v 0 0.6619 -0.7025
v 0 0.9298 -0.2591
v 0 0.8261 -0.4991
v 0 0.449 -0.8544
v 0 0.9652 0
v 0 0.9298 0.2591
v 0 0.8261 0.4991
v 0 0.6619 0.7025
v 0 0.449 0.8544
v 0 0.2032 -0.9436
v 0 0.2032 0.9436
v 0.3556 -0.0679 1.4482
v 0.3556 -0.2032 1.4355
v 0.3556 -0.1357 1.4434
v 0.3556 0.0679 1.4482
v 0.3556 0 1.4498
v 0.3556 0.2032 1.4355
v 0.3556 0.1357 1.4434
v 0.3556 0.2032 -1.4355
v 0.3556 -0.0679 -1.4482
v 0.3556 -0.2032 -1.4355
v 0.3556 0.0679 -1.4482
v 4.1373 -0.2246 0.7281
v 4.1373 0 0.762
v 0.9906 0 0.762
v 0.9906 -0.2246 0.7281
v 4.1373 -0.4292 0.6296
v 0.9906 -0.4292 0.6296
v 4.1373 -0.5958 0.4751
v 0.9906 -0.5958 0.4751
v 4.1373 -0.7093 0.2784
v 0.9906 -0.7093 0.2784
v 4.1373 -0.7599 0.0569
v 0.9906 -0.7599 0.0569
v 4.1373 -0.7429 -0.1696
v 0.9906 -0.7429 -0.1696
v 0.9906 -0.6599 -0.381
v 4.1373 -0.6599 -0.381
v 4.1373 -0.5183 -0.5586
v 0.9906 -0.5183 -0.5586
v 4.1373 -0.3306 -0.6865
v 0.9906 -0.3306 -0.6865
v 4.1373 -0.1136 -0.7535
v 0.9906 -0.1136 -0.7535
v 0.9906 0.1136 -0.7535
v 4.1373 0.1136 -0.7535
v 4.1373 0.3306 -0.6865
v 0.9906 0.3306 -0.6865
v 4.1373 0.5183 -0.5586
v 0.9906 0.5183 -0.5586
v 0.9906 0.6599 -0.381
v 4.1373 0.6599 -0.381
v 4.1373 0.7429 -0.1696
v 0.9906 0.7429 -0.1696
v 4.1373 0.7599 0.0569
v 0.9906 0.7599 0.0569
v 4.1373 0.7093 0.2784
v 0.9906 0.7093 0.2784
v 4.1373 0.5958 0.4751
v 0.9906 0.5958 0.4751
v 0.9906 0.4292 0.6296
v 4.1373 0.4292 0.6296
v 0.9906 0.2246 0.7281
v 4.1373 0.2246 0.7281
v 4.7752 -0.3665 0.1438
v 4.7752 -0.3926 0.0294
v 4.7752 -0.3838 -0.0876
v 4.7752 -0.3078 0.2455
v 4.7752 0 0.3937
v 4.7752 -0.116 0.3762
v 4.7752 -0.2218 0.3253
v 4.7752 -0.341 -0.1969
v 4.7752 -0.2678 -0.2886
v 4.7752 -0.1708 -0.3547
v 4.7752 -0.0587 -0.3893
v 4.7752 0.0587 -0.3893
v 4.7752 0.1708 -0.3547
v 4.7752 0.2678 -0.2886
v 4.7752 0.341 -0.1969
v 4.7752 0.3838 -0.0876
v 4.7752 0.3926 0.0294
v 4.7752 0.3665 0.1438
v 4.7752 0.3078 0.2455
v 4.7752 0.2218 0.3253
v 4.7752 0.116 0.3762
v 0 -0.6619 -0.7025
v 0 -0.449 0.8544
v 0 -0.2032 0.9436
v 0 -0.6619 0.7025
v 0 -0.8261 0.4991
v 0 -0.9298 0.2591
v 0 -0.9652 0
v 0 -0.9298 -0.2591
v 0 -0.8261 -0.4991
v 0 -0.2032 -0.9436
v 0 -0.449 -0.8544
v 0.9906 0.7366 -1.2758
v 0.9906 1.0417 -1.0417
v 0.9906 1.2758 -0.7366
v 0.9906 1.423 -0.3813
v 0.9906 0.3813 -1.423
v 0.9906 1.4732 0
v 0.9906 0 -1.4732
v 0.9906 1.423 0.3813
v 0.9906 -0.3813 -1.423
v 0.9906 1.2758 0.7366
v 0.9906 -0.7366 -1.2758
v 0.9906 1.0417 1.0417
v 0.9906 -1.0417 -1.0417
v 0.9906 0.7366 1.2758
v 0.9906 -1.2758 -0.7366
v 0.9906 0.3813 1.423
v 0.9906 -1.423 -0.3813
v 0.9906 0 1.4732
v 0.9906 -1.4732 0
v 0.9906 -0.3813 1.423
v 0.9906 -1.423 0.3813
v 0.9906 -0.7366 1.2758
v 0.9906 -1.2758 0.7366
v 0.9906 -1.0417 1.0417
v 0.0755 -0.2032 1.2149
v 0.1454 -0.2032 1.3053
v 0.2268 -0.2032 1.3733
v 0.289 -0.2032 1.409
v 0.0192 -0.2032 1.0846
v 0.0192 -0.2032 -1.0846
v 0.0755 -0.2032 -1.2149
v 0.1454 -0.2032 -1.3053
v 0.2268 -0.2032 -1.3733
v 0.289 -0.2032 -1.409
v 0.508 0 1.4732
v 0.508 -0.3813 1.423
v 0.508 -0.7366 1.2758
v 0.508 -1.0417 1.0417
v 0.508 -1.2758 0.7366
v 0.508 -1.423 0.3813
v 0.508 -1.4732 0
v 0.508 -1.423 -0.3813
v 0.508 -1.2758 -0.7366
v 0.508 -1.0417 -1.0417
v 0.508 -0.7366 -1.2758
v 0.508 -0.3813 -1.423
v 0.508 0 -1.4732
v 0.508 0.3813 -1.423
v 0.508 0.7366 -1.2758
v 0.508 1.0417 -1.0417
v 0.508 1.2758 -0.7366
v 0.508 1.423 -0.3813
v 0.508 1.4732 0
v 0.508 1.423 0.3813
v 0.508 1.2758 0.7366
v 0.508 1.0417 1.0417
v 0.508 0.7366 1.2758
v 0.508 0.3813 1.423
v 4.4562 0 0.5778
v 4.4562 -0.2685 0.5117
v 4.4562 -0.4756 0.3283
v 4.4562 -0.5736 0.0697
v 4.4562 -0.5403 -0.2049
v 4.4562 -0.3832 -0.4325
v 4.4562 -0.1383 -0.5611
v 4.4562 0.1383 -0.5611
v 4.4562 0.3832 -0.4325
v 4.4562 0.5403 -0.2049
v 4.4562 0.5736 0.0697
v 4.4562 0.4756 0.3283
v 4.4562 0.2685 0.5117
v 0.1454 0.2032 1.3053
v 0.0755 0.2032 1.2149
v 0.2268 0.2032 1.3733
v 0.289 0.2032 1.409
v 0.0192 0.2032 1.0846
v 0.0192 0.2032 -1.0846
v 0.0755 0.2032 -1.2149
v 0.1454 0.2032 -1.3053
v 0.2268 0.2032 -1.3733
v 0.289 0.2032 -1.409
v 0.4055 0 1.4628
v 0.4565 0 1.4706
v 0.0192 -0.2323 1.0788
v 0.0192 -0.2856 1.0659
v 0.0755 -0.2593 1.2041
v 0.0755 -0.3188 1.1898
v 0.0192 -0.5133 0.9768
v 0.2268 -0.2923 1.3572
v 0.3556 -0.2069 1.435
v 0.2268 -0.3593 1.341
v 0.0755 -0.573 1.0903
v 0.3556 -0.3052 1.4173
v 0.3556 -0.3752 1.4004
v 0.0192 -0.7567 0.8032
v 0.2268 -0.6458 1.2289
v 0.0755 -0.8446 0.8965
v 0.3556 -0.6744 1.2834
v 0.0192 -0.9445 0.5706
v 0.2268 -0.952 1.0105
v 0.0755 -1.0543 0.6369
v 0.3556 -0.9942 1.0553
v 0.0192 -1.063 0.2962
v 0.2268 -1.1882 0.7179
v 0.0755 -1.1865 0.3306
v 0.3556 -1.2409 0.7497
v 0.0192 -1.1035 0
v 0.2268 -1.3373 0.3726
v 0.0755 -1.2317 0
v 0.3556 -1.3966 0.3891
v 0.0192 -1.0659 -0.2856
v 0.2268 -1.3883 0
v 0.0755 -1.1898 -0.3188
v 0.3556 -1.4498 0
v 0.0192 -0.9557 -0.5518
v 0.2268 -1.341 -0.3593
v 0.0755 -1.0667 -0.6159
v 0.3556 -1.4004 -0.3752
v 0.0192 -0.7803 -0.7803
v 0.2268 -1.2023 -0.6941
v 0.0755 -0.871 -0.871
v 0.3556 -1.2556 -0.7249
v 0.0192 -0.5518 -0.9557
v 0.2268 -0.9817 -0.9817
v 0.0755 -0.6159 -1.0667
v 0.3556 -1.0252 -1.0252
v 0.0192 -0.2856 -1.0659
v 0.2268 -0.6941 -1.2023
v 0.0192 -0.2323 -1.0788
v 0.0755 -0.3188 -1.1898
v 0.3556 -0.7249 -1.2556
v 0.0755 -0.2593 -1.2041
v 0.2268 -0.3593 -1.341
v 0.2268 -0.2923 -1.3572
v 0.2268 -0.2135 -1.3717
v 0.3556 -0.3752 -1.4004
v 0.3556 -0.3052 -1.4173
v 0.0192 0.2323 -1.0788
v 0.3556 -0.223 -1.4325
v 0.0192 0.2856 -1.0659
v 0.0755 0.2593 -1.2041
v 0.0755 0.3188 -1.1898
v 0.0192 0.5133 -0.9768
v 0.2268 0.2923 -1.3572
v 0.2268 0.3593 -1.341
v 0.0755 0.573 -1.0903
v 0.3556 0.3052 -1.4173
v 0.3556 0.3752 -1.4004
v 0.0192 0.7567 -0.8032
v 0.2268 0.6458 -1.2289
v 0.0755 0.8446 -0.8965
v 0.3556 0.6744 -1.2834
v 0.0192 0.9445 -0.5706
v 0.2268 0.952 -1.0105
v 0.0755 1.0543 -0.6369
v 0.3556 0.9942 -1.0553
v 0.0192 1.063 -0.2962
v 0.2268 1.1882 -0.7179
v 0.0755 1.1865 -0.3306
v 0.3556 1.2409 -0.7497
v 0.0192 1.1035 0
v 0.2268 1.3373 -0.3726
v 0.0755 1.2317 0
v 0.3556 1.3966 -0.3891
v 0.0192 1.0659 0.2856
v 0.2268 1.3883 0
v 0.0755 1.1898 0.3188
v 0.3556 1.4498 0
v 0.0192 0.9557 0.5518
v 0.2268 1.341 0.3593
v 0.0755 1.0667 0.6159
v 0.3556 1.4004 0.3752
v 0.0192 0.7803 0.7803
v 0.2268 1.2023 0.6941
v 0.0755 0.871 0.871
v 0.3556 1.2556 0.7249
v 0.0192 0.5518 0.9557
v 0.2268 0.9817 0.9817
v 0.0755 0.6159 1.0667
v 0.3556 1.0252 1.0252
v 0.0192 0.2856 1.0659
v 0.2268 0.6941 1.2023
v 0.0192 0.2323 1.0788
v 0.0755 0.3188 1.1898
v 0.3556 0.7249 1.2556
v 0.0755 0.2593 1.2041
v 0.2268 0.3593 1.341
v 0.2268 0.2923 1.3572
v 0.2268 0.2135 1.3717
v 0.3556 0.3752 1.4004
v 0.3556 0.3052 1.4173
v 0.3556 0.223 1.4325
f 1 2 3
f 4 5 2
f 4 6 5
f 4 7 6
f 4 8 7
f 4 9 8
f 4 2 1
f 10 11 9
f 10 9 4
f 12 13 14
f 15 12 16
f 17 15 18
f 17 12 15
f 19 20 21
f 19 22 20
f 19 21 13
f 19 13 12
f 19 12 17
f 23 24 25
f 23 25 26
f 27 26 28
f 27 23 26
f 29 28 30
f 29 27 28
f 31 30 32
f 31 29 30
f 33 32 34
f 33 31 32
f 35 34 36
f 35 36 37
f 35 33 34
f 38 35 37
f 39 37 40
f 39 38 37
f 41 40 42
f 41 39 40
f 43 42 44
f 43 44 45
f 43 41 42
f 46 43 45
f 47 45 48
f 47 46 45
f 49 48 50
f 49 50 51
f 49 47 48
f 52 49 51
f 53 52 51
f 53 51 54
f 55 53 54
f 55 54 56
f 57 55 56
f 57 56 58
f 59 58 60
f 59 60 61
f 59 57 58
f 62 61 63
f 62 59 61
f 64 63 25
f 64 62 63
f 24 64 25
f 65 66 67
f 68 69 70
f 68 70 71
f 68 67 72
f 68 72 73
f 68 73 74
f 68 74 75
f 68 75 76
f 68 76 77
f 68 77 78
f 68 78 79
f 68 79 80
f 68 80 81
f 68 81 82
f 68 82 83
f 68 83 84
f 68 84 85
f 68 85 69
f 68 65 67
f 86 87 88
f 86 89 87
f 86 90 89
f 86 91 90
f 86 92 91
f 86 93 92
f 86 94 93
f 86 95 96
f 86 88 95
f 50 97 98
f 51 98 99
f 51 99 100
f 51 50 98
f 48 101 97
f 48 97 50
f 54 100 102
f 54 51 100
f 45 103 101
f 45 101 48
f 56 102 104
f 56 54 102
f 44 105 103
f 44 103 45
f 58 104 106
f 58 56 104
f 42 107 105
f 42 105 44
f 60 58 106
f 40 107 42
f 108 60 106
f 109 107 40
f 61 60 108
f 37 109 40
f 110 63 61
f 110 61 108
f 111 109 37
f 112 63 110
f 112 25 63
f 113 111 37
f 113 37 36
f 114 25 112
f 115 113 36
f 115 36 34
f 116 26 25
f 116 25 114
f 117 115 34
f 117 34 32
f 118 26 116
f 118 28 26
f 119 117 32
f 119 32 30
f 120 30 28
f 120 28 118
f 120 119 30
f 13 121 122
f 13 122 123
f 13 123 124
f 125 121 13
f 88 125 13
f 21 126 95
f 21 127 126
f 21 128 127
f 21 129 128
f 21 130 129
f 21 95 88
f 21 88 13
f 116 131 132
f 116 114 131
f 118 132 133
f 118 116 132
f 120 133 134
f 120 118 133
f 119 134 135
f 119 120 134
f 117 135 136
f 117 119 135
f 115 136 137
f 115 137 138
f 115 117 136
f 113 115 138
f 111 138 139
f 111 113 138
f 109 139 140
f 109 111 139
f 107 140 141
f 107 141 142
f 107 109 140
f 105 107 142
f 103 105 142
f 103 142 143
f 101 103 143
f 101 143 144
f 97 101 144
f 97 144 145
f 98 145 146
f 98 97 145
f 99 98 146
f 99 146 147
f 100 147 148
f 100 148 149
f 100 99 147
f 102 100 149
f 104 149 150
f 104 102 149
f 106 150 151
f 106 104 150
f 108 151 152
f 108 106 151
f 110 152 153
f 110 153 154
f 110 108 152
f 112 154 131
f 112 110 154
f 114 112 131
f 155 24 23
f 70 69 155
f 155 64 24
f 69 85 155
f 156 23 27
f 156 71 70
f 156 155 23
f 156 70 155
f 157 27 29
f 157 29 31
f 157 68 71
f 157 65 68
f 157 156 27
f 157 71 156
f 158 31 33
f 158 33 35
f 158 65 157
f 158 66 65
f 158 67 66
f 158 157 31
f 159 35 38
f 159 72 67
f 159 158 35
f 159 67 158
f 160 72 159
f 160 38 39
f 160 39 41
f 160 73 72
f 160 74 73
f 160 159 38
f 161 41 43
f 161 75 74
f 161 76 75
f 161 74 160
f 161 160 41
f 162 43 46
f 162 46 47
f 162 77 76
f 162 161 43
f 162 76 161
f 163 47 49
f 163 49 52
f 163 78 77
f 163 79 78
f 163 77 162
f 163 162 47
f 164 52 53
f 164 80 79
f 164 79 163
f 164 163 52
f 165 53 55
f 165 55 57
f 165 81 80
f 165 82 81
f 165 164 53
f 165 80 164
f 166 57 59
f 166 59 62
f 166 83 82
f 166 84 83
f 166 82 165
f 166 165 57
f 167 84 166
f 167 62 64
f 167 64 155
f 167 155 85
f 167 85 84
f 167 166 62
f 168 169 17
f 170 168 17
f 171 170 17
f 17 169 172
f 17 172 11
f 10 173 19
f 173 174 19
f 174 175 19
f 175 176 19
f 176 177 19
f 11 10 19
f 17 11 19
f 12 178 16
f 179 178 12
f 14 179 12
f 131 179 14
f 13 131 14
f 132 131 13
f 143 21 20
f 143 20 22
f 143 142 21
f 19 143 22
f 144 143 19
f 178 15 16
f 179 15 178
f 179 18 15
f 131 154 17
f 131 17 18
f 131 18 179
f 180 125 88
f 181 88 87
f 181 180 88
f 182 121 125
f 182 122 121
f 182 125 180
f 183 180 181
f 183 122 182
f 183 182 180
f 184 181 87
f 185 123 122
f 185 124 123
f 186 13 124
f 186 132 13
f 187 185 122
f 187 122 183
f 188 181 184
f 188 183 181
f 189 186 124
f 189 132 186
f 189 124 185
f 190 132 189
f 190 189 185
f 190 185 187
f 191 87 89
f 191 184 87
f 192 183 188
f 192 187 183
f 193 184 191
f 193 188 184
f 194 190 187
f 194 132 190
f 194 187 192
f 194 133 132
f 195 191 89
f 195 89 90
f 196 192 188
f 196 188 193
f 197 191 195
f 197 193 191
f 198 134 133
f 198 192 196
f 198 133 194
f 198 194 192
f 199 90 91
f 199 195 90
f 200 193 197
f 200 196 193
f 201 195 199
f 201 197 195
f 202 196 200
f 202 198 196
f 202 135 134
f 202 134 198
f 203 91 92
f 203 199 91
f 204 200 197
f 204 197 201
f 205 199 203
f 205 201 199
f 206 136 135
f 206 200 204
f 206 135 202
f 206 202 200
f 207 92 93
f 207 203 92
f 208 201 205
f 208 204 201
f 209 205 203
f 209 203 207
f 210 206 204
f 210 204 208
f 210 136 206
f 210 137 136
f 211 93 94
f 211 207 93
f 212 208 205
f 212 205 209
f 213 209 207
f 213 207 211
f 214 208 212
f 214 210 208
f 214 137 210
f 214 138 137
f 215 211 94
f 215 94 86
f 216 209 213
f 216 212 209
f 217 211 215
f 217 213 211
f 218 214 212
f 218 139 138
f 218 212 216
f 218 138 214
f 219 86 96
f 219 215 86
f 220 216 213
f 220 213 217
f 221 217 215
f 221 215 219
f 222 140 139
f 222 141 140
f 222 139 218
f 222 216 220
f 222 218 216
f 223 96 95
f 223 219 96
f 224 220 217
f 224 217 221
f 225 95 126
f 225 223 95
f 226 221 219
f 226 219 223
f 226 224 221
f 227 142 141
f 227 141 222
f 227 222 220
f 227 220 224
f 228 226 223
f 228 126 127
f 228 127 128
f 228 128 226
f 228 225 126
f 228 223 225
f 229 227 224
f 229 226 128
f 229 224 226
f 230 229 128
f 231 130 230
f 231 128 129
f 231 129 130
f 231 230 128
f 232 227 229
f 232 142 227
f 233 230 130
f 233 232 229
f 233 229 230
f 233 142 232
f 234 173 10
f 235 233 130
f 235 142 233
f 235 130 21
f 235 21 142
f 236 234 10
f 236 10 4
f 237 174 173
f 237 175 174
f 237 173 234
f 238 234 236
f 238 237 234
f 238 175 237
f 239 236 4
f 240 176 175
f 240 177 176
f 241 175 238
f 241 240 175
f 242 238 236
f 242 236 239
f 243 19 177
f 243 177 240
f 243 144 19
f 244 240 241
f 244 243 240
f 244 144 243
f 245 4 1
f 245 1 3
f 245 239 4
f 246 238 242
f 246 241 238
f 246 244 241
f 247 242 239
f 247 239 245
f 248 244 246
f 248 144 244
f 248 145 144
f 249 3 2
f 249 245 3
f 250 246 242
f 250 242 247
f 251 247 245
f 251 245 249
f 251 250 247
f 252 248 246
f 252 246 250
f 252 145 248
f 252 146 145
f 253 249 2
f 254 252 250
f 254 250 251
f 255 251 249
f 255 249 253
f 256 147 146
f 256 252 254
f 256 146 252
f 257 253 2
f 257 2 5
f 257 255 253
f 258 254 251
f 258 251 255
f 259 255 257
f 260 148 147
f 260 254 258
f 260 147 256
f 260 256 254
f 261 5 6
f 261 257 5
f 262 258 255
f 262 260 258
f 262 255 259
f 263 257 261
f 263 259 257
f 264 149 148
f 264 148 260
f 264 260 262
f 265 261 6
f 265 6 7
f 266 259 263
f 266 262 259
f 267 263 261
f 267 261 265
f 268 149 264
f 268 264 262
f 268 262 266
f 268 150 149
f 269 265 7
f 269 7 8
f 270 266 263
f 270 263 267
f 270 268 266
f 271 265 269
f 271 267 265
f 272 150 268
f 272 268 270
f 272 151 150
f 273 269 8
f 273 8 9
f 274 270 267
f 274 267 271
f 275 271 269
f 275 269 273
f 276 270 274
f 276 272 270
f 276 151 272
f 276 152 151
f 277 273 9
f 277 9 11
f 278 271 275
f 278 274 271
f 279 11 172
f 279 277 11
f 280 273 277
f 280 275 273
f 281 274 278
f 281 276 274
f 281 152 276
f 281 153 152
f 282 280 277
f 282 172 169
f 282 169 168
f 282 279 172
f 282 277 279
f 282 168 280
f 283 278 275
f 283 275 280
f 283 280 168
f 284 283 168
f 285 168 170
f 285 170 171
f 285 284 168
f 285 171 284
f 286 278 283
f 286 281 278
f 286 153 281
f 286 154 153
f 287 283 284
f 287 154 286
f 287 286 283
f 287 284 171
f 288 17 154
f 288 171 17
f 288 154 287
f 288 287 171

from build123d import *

# Parameters (mm, degrees)
SLOT_CUT_EXTRUDE1_DEPTH      = 6.20991095
SLOT_CUT_EXTRUDE1_DEPTH_BACK = 6.20991095
SKETCH2_W                    = 0.3556
SKETCH2_H                    = 0.4064


with BuildPart() as part:
    # Sketch1 → base-Revolve (revolve)
    with BuildSketch(Plane.XY, mode=Mode.PRIVATE) as base_revolve_sk:
        with BuildLine():
            Line((0, 0), (0, 0.9652))
            ThreePointArc((0, 0.9652), (0.148789755, 1.324410245), (0.508, 1.4732))
            Line((0.508, 1.4732), (0.9906, 1.4732))
            Line((0.9906, 1.4732), (0.9906, 0.762))
            Line((0.9906, 0.762), (4.7752, 0.762))
            Line((4.7752, 0.762), (4.7752, 0))
            Line((4.7752, 0), (0, 0))
        make_face()
    revolve(base_revolve_sk.sketch.rotate(Axis((0, 0, 0), (1, 0, 0)), 90), axis=Axis((0, 0, 0), (1, 0, 0)))

    # Sketch2 → slot_Cut-Extrude1 (cut, two sides: drawn at the far end of the back side and taken through both)
    with BuildSketch(Plane.XY.offset(-SLOT_CUT_EXTRUDE1_DEPTH_BACK)):
        with Locations((0.1778, 0)):
            Rectangle(SKETCH2_W, SKETCH2_H)
    extrude(amount=SLOT_CUT_EXTRUDE1_DEPTH + SLOT_CUT_EXTRUDE1_DEPTH_BACK, mode=Mode.SUBTRACT)

    # Sketch8 → point_Cut-Revolve1 (revolve, cut)
    with BuildSketch(Plane.XY, mode=Mode.PRIVATE) as point_cut_revolve1_sk:
        Polygon((4.7752, 0), (5.2832, 0), (5.2832, 1.27), (4.137285688, 1.27), (4.137285688, 0.762), (4.7752, 0.3937), align=None)
    revolve(point_cut_revolve1_sk.sketch.rotate(Axis((0, 0, 0), (1, 0, 0)), 90), axis=Axis((0, 0, 0), (1, 0, 0)), mode=Mode.SUBTRACT)


solid = part.part
